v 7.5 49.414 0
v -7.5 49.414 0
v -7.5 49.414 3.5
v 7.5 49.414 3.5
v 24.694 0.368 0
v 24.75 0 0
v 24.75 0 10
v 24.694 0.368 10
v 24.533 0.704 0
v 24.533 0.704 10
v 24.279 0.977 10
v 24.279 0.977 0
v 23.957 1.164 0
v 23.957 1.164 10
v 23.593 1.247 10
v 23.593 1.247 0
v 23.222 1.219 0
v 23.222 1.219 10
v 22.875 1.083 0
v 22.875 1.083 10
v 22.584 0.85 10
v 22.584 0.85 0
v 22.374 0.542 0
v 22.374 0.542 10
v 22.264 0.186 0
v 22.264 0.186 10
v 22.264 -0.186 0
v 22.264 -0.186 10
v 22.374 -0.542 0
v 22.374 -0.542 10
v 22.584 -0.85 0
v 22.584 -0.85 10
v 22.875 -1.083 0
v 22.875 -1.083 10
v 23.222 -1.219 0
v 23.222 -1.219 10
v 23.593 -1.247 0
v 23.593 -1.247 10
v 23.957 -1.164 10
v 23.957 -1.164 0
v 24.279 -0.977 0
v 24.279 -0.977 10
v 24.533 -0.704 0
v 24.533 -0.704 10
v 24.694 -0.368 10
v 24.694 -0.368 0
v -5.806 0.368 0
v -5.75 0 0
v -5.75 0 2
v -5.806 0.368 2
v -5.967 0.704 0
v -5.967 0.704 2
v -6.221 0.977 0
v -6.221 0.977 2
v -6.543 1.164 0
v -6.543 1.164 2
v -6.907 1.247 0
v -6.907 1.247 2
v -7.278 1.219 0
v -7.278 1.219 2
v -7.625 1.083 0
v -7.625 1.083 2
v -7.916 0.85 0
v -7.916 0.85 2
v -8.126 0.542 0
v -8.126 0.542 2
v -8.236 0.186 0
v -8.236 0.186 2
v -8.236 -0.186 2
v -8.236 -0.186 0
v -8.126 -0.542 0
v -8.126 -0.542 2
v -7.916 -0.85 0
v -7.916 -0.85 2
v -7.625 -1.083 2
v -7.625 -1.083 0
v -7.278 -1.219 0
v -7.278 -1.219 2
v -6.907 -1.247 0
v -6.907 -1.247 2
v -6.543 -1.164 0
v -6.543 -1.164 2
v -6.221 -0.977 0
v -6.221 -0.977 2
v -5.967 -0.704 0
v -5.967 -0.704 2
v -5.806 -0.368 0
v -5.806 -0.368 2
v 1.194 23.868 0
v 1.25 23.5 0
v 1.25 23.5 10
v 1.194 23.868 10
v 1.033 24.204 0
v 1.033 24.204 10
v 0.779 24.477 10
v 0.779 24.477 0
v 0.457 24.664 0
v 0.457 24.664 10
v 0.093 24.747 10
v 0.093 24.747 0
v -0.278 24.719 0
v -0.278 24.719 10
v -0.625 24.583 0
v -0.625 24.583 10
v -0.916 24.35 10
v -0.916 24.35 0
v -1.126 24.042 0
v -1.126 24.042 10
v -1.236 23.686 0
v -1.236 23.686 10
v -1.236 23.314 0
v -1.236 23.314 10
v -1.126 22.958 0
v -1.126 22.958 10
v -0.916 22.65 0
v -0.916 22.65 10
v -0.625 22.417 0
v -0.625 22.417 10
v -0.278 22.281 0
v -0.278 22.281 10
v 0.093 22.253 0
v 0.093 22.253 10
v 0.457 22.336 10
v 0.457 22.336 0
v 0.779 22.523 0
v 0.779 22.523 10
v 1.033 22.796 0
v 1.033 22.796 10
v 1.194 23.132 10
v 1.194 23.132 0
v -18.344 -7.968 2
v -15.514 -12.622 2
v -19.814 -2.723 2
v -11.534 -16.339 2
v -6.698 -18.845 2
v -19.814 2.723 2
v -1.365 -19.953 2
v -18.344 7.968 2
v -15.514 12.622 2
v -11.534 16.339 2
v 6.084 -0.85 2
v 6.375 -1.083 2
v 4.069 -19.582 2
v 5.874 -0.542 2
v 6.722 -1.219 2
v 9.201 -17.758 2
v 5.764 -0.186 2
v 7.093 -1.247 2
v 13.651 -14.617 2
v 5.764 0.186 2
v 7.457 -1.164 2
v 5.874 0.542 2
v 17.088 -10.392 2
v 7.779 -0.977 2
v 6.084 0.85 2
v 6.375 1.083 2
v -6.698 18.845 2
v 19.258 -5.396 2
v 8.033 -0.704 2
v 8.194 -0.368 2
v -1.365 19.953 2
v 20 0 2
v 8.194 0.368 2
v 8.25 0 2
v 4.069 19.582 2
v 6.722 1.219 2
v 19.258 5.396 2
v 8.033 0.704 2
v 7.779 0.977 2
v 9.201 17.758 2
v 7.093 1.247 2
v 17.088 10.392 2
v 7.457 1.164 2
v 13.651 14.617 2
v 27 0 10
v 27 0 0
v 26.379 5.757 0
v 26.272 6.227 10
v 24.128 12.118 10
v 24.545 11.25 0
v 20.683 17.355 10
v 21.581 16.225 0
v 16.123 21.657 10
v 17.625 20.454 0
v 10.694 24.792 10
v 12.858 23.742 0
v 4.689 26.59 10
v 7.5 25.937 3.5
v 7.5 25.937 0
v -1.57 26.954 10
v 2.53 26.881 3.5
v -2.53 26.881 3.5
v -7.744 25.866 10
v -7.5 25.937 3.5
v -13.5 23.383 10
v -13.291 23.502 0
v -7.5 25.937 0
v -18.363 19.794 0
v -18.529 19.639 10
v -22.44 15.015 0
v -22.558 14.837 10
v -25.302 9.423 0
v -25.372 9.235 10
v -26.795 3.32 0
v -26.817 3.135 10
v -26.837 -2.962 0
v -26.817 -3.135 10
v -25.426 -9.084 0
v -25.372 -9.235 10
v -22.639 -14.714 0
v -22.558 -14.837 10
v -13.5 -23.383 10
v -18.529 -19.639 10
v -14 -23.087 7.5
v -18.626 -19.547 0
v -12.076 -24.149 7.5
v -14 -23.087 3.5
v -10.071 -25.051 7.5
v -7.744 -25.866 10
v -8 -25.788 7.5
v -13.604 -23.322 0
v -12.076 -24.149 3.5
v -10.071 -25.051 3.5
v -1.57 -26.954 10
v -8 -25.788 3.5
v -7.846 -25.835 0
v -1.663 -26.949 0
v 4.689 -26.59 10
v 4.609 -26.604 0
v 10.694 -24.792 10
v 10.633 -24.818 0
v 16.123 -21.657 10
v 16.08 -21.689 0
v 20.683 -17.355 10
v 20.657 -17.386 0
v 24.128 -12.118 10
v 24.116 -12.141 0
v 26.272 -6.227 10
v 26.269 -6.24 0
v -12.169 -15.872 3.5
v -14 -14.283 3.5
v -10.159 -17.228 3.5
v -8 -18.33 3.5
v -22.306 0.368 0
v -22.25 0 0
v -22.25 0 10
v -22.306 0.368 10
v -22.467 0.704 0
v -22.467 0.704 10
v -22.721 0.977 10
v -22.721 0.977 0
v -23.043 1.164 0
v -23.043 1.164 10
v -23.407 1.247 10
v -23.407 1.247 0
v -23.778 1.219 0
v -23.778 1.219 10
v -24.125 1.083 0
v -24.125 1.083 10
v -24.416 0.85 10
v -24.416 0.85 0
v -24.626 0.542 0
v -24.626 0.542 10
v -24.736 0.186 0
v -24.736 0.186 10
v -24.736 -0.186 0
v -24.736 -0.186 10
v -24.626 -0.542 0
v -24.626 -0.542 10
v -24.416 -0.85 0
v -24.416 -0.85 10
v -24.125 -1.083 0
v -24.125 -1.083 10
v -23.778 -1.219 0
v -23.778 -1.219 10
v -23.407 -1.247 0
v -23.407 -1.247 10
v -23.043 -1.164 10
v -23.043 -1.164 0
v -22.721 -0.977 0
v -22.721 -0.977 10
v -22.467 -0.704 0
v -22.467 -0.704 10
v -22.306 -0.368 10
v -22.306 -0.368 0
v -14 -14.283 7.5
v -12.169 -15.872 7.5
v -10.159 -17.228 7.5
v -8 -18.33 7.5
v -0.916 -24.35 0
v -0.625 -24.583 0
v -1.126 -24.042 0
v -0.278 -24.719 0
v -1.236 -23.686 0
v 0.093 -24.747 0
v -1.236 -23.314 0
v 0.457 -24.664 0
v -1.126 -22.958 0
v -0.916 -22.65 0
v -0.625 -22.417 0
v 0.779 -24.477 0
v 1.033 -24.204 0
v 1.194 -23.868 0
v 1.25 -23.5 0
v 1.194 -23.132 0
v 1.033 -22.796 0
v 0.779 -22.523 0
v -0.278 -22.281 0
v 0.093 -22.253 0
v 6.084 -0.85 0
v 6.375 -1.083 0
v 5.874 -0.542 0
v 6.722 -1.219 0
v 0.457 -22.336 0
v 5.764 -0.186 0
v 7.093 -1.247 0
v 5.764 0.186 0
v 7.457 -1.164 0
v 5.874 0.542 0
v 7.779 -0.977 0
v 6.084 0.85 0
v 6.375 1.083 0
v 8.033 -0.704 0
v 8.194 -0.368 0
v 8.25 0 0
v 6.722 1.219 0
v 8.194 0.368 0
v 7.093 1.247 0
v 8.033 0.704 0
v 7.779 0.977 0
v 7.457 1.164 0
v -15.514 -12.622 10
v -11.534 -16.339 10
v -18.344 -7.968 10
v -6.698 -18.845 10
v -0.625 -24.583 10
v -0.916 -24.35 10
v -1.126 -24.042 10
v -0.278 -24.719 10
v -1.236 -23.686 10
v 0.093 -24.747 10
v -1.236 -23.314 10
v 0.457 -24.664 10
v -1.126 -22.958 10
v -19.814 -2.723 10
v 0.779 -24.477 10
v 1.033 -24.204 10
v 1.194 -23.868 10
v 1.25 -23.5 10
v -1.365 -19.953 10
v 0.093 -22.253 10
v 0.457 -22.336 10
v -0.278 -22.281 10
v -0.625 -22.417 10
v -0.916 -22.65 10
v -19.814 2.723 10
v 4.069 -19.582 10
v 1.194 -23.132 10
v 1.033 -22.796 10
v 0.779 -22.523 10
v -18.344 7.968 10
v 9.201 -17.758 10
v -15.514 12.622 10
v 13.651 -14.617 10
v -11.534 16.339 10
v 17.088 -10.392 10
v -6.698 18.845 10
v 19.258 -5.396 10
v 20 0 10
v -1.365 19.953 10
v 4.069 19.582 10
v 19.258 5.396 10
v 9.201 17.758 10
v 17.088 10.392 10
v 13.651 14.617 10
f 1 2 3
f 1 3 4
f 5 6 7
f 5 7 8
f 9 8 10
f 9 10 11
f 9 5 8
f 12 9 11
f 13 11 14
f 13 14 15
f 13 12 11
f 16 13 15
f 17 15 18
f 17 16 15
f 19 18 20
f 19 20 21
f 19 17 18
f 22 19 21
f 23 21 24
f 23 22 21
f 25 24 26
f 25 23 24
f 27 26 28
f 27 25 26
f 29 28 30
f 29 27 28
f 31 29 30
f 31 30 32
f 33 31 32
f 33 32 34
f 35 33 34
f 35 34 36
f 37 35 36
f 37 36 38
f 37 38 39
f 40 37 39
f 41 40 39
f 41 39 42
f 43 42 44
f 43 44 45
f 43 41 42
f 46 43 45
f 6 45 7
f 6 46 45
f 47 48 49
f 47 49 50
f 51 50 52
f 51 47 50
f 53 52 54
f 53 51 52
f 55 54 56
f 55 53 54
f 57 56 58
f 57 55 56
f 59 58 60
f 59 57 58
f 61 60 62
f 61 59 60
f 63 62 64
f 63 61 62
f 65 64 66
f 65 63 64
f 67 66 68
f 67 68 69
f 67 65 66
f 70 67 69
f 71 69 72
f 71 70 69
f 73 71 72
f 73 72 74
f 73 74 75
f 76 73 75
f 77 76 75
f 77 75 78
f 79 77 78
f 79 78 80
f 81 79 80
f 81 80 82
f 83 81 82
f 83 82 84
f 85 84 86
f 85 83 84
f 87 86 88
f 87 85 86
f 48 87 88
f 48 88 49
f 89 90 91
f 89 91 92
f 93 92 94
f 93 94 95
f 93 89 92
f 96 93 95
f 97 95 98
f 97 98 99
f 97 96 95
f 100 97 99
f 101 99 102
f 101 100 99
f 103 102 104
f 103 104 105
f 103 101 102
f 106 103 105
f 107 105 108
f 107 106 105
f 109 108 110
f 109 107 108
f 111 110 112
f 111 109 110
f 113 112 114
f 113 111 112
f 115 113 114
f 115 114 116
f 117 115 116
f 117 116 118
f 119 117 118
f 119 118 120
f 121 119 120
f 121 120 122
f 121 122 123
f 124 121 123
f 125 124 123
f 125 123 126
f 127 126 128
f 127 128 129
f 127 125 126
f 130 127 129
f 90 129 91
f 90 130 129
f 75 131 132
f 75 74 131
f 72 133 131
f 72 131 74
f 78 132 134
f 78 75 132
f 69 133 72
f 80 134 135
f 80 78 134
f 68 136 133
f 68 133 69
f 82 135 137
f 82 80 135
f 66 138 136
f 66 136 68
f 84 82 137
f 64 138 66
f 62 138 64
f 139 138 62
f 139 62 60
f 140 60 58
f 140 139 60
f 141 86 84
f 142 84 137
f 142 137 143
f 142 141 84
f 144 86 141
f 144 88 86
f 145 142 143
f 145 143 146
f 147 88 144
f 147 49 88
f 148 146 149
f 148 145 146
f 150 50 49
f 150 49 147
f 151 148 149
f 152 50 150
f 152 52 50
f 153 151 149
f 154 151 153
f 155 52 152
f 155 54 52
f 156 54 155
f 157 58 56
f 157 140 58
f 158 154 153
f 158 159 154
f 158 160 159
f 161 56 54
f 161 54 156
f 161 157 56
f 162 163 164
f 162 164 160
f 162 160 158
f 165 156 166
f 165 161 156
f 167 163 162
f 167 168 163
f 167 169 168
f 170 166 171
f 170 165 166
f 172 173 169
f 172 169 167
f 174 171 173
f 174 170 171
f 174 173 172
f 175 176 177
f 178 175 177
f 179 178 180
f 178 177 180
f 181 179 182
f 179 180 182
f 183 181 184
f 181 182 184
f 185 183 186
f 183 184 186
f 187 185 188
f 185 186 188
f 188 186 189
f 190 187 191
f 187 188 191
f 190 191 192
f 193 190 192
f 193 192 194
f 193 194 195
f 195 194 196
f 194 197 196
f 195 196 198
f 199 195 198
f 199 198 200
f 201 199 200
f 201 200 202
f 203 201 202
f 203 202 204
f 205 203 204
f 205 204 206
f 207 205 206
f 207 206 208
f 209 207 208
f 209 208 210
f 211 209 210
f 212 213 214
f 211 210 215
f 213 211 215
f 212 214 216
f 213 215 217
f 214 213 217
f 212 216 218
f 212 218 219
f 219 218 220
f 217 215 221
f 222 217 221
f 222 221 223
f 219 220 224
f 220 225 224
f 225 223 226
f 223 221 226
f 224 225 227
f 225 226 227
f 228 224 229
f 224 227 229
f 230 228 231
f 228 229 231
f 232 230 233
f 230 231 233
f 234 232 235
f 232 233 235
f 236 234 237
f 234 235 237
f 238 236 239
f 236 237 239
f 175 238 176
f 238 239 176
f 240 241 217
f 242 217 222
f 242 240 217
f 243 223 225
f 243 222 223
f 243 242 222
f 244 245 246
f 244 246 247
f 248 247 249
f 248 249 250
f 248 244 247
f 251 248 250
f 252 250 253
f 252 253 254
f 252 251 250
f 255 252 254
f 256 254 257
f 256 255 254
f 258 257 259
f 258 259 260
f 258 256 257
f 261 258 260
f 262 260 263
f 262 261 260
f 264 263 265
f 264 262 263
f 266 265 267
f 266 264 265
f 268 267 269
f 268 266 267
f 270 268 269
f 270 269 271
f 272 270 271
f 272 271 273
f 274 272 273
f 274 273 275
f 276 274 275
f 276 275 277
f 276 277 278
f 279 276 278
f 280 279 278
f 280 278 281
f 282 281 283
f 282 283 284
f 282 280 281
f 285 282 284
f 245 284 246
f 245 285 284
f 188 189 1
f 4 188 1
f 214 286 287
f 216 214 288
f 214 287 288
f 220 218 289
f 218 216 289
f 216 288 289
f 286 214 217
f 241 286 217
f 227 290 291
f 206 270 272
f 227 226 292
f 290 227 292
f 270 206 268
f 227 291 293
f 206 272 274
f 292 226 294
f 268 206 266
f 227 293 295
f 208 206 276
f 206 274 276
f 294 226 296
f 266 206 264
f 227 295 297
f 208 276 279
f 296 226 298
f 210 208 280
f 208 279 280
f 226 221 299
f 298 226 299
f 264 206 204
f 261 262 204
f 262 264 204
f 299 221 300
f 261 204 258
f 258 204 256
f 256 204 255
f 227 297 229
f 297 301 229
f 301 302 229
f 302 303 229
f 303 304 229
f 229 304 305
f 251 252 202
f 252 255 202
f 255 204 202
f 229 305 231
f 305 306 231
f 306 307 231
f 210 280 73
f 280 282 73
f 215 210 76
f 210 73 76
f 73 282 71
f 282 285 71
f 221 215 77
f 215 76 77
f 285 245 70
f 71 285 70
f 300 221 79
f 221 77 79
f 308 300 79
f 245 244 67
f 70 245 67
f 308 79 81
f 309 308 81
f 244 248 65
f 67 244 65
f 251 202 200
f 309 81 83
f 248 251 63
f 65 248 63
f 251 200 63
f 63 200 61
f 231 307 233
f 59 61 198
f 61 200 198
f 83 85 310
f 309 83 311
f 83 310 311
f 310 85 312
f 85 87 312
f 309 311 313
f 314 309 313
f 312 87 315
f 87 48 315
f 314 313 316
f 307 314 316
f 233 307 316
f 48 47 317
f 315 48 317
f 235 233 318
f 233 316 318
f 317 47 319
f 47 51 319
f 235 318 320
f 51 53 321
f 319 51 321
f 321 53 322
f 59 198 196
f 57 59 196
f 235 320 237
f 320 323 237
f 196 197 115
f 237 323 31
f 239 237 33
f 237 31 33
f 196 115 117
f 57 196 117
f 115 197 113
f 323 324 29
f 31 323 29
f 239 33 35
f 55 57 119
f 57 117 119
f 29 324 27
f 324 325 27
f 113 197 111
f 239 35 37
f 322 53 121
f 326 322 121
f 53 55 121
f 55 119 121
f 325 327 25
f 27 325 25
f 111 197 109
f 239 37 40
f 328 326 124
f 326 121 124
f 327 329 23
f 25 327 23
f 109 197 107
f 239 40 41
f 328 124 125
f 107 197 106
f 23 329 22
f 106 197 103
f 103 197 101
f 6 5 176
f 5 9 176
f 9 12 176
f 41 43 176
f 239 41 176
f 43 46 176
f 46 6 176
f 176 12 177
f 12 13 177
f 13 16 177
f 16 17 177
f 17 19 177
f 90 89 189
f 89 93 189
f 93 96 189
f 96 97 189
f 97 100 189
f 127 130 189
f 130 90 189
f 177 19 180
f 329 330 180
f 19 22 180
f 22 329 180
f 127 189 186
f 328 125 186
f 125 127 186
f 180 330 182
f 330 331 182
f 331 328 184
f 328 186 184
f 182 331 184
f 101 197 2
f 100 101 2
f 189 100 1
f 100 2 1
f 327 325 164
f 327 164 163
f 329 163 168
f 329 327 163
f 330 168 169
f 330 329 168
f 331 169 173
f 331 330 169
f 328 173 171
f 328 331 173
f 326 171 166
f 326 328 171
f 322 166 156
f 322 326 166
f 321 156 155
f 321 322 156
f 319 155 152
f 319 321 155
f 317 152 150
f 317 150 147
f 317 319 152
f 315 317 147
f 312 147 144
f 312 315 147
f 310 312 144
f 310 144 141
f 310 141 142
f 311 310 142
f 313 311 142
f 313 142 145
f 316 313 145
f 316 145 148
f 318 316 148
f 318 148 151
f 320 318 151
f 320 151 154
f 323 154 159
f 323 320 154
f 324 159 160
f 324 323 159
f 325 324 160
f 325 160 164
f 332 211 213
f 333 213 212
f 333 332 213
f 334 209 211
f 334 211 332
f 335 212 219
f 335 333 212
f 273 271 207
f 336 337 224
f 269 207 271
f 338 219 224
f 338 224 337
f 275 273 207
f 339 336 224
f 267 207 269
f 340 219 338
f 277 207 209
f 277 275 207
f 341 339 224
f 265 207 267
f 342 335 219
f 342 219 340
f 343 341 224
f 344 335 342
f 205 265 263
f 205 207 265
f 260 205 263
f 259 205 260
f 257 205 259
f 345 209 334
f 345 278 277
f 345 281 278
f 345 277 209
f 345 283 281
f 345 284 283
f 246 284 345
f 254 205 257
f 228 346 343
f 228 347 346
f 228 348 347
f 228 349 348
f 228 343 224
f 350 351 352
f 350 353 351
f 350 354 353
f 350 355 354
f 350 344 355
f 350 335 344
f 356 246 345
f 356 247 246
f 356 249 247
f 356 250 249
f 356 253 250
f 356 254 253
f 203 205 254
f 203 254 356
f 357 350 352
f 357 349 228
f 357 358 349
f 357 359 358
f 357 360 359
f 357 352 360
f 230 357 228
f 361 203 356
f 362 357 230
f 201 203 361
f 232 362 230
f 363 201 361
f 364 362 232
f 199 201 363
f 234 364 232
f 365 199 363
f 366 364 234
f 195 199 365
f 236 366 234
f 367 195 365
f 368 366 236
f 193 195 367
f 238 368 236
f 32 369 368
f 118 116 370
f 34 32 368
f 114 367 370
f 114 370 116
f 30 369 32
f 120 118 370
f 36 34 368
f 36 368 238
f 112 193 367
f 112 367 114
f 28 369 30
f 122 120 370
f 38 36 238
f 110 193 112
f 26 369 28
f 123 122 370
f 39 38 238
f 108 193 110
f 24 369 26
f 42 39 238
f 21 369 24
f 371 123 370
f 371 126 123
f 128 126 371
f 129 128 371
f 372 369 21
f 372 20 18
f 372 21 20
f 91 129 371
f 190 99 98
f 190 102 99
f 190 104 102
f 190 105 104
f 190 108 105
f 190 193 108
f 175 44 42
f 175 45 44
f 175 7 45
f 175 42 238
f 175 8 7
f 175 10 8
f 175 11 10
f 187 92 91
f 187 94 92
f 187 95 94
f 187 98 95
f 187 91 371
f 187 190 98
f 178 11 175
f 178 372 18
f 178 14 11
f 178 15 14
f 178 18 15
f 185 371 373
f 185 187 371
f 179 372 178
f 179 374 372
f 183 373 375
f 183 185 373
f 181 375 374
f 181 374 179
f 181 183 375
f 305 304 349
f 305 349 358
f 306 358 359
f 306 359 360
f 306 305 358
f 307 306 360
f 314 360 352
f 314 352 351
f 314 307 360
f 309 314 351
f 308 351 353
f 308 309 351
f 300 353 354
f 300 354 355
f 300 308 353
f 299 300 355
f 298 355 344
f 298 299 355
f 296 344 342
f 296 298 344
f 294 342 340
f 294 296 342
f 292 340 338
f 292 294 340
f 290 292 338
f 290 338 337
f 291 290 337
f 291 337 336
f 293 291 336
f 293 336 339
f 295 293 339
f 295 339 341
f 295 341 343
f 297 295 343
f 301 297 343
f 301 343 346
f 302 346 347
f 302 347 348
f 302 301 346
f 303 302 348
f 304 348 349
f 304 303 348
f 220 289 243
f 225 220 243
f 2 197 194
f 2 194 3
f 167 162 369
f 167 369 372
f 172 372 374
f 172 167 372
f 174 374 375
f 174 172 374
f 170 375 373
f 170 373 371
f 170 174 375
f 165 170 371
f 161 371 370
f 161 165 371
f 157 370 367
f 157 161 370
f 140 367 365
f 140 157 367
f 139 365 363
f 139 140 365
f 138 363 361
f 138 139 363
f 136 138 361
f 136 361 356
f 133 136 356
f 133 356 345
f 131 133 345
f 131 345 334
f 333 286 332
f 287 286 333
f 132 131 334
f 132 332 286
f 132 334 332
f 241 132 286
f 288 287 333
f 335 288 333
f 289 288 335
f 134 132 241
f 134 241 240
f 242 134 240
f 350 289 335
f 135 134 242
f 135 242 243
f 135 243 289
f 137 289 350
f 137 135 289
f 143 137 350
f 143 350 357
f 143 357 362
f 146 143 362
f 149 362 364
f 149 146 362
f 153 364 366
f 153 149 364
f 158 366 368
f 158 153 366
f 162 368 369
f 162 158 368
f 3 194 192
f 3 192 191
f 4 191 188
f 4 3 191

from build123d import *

# Parameters (mm, degrees)
SKETCH1_R               = 27
SKETCH1_R_2             = 1.25
SKETCH1_R_3             = 20
BOSS_EXTRUDE1_DEPTH     = 10
SKETCH3_R               = 20
SKETCH3_R_2             = 1.25
BOSS_EXTRUDE2_DEPTH     = 2
SKETCH5_W               = 15
SKETCH5_H               = 24.16646527
BOSS_EXTRUDE3_DEPTH     = 3.5
CUT_EXTRUDE1_REACH      = 59.191
CUT_EXTRUDE1_END_RADIUS = 27
SKETCH4_W               = 6
SKETCH4_H               = 4


with BuildPart() as part:
    # Sketch1 → Boss-Extrude1 (new body)
    with BuildSketch(Plane.XY):
        Circle(SKETCH1_R)
        with Locations((0, 23.5)):
            Circle(SKETCH1_R_2, mode=Mode.SUBTRACT)
        with Locations((23.5, 0)):
            Circle(SKETCH1_R_2, mode=Mode.SUBTRACT)
        with Locations((0, -23.5)):
            Circle(SKETCH1_R_2, mode=Mode.SUBTRACT)
        with Locations((-23.5, 0)):
            Circle(SKETCH1_R_2, mode=Mode.SUBTRACT)
        Circle(SKETCH1_R_3, mode=Mode.SUBTRACT)
    extrude(amount=BOSS_EXTRUDE1_DEPTH)

    # Sketch3 → Boss-Extrude2 (add)
    with BuildSketch(Plane.XY):
        Circle(SKETCH3_R)
        with Locations((-7, 0)):
            Circle(SKETCH3_R_2, mode=Mode.SUBTRACT)
        with Locations((7, 0)):
            Circle(SKETCH3_R_2, mode=Mode.SUBTRACT)
    extrude(amount=BOSS_EXTRUDE2_DEPTH)

    # Sketch5 → Boss-Extrude3 (add)
    with BuildSketch(Plane.XY):
        with Locations((0, 37.331237278)):
            Rectangle(SKETCH5_W, SKETCH5_H)
    extrude(amount=BOSS_EXTRUDE3_DEPTH)

    # Cut-Extrude1: up to this cylinder (the profile starts inside it)
    cut_extrude1_end = Plane(origin=(0, 0, 5.5), z_dir=(0, 0, -1)) * Cylinder(CUT_EXTRUDE1_END_RADIUS, 173.382, mode=Mode.PRIVATE)
    # Sketch4 → Cut-Extrude1 (cut, up to the surface)
    with BuildSketch(Plane(origin=(0, 0, 0), x_dir=(1, 0, 0), z_dir=(0, 1, 0)), mode=Mode.PRIVATE) as cut_extrude1_sk1:
        with Locations((-11, -5.5)):
            Rectangle(SKETCH4_W, SKETCH4_H)
    cut_extrude1_tool1 = extrude(cut_extrude1_sk1.sketch, amount=-CUT_EXTRUDE1_REACH, mode=Mode.PRIVATE) & cut_extrude1_end
    add(cut_extrude1_tool1.solids().sort_by_distance((-11, 0, 5.5))[0], mode=Mode.SUBTRACT)


solid = part.part
